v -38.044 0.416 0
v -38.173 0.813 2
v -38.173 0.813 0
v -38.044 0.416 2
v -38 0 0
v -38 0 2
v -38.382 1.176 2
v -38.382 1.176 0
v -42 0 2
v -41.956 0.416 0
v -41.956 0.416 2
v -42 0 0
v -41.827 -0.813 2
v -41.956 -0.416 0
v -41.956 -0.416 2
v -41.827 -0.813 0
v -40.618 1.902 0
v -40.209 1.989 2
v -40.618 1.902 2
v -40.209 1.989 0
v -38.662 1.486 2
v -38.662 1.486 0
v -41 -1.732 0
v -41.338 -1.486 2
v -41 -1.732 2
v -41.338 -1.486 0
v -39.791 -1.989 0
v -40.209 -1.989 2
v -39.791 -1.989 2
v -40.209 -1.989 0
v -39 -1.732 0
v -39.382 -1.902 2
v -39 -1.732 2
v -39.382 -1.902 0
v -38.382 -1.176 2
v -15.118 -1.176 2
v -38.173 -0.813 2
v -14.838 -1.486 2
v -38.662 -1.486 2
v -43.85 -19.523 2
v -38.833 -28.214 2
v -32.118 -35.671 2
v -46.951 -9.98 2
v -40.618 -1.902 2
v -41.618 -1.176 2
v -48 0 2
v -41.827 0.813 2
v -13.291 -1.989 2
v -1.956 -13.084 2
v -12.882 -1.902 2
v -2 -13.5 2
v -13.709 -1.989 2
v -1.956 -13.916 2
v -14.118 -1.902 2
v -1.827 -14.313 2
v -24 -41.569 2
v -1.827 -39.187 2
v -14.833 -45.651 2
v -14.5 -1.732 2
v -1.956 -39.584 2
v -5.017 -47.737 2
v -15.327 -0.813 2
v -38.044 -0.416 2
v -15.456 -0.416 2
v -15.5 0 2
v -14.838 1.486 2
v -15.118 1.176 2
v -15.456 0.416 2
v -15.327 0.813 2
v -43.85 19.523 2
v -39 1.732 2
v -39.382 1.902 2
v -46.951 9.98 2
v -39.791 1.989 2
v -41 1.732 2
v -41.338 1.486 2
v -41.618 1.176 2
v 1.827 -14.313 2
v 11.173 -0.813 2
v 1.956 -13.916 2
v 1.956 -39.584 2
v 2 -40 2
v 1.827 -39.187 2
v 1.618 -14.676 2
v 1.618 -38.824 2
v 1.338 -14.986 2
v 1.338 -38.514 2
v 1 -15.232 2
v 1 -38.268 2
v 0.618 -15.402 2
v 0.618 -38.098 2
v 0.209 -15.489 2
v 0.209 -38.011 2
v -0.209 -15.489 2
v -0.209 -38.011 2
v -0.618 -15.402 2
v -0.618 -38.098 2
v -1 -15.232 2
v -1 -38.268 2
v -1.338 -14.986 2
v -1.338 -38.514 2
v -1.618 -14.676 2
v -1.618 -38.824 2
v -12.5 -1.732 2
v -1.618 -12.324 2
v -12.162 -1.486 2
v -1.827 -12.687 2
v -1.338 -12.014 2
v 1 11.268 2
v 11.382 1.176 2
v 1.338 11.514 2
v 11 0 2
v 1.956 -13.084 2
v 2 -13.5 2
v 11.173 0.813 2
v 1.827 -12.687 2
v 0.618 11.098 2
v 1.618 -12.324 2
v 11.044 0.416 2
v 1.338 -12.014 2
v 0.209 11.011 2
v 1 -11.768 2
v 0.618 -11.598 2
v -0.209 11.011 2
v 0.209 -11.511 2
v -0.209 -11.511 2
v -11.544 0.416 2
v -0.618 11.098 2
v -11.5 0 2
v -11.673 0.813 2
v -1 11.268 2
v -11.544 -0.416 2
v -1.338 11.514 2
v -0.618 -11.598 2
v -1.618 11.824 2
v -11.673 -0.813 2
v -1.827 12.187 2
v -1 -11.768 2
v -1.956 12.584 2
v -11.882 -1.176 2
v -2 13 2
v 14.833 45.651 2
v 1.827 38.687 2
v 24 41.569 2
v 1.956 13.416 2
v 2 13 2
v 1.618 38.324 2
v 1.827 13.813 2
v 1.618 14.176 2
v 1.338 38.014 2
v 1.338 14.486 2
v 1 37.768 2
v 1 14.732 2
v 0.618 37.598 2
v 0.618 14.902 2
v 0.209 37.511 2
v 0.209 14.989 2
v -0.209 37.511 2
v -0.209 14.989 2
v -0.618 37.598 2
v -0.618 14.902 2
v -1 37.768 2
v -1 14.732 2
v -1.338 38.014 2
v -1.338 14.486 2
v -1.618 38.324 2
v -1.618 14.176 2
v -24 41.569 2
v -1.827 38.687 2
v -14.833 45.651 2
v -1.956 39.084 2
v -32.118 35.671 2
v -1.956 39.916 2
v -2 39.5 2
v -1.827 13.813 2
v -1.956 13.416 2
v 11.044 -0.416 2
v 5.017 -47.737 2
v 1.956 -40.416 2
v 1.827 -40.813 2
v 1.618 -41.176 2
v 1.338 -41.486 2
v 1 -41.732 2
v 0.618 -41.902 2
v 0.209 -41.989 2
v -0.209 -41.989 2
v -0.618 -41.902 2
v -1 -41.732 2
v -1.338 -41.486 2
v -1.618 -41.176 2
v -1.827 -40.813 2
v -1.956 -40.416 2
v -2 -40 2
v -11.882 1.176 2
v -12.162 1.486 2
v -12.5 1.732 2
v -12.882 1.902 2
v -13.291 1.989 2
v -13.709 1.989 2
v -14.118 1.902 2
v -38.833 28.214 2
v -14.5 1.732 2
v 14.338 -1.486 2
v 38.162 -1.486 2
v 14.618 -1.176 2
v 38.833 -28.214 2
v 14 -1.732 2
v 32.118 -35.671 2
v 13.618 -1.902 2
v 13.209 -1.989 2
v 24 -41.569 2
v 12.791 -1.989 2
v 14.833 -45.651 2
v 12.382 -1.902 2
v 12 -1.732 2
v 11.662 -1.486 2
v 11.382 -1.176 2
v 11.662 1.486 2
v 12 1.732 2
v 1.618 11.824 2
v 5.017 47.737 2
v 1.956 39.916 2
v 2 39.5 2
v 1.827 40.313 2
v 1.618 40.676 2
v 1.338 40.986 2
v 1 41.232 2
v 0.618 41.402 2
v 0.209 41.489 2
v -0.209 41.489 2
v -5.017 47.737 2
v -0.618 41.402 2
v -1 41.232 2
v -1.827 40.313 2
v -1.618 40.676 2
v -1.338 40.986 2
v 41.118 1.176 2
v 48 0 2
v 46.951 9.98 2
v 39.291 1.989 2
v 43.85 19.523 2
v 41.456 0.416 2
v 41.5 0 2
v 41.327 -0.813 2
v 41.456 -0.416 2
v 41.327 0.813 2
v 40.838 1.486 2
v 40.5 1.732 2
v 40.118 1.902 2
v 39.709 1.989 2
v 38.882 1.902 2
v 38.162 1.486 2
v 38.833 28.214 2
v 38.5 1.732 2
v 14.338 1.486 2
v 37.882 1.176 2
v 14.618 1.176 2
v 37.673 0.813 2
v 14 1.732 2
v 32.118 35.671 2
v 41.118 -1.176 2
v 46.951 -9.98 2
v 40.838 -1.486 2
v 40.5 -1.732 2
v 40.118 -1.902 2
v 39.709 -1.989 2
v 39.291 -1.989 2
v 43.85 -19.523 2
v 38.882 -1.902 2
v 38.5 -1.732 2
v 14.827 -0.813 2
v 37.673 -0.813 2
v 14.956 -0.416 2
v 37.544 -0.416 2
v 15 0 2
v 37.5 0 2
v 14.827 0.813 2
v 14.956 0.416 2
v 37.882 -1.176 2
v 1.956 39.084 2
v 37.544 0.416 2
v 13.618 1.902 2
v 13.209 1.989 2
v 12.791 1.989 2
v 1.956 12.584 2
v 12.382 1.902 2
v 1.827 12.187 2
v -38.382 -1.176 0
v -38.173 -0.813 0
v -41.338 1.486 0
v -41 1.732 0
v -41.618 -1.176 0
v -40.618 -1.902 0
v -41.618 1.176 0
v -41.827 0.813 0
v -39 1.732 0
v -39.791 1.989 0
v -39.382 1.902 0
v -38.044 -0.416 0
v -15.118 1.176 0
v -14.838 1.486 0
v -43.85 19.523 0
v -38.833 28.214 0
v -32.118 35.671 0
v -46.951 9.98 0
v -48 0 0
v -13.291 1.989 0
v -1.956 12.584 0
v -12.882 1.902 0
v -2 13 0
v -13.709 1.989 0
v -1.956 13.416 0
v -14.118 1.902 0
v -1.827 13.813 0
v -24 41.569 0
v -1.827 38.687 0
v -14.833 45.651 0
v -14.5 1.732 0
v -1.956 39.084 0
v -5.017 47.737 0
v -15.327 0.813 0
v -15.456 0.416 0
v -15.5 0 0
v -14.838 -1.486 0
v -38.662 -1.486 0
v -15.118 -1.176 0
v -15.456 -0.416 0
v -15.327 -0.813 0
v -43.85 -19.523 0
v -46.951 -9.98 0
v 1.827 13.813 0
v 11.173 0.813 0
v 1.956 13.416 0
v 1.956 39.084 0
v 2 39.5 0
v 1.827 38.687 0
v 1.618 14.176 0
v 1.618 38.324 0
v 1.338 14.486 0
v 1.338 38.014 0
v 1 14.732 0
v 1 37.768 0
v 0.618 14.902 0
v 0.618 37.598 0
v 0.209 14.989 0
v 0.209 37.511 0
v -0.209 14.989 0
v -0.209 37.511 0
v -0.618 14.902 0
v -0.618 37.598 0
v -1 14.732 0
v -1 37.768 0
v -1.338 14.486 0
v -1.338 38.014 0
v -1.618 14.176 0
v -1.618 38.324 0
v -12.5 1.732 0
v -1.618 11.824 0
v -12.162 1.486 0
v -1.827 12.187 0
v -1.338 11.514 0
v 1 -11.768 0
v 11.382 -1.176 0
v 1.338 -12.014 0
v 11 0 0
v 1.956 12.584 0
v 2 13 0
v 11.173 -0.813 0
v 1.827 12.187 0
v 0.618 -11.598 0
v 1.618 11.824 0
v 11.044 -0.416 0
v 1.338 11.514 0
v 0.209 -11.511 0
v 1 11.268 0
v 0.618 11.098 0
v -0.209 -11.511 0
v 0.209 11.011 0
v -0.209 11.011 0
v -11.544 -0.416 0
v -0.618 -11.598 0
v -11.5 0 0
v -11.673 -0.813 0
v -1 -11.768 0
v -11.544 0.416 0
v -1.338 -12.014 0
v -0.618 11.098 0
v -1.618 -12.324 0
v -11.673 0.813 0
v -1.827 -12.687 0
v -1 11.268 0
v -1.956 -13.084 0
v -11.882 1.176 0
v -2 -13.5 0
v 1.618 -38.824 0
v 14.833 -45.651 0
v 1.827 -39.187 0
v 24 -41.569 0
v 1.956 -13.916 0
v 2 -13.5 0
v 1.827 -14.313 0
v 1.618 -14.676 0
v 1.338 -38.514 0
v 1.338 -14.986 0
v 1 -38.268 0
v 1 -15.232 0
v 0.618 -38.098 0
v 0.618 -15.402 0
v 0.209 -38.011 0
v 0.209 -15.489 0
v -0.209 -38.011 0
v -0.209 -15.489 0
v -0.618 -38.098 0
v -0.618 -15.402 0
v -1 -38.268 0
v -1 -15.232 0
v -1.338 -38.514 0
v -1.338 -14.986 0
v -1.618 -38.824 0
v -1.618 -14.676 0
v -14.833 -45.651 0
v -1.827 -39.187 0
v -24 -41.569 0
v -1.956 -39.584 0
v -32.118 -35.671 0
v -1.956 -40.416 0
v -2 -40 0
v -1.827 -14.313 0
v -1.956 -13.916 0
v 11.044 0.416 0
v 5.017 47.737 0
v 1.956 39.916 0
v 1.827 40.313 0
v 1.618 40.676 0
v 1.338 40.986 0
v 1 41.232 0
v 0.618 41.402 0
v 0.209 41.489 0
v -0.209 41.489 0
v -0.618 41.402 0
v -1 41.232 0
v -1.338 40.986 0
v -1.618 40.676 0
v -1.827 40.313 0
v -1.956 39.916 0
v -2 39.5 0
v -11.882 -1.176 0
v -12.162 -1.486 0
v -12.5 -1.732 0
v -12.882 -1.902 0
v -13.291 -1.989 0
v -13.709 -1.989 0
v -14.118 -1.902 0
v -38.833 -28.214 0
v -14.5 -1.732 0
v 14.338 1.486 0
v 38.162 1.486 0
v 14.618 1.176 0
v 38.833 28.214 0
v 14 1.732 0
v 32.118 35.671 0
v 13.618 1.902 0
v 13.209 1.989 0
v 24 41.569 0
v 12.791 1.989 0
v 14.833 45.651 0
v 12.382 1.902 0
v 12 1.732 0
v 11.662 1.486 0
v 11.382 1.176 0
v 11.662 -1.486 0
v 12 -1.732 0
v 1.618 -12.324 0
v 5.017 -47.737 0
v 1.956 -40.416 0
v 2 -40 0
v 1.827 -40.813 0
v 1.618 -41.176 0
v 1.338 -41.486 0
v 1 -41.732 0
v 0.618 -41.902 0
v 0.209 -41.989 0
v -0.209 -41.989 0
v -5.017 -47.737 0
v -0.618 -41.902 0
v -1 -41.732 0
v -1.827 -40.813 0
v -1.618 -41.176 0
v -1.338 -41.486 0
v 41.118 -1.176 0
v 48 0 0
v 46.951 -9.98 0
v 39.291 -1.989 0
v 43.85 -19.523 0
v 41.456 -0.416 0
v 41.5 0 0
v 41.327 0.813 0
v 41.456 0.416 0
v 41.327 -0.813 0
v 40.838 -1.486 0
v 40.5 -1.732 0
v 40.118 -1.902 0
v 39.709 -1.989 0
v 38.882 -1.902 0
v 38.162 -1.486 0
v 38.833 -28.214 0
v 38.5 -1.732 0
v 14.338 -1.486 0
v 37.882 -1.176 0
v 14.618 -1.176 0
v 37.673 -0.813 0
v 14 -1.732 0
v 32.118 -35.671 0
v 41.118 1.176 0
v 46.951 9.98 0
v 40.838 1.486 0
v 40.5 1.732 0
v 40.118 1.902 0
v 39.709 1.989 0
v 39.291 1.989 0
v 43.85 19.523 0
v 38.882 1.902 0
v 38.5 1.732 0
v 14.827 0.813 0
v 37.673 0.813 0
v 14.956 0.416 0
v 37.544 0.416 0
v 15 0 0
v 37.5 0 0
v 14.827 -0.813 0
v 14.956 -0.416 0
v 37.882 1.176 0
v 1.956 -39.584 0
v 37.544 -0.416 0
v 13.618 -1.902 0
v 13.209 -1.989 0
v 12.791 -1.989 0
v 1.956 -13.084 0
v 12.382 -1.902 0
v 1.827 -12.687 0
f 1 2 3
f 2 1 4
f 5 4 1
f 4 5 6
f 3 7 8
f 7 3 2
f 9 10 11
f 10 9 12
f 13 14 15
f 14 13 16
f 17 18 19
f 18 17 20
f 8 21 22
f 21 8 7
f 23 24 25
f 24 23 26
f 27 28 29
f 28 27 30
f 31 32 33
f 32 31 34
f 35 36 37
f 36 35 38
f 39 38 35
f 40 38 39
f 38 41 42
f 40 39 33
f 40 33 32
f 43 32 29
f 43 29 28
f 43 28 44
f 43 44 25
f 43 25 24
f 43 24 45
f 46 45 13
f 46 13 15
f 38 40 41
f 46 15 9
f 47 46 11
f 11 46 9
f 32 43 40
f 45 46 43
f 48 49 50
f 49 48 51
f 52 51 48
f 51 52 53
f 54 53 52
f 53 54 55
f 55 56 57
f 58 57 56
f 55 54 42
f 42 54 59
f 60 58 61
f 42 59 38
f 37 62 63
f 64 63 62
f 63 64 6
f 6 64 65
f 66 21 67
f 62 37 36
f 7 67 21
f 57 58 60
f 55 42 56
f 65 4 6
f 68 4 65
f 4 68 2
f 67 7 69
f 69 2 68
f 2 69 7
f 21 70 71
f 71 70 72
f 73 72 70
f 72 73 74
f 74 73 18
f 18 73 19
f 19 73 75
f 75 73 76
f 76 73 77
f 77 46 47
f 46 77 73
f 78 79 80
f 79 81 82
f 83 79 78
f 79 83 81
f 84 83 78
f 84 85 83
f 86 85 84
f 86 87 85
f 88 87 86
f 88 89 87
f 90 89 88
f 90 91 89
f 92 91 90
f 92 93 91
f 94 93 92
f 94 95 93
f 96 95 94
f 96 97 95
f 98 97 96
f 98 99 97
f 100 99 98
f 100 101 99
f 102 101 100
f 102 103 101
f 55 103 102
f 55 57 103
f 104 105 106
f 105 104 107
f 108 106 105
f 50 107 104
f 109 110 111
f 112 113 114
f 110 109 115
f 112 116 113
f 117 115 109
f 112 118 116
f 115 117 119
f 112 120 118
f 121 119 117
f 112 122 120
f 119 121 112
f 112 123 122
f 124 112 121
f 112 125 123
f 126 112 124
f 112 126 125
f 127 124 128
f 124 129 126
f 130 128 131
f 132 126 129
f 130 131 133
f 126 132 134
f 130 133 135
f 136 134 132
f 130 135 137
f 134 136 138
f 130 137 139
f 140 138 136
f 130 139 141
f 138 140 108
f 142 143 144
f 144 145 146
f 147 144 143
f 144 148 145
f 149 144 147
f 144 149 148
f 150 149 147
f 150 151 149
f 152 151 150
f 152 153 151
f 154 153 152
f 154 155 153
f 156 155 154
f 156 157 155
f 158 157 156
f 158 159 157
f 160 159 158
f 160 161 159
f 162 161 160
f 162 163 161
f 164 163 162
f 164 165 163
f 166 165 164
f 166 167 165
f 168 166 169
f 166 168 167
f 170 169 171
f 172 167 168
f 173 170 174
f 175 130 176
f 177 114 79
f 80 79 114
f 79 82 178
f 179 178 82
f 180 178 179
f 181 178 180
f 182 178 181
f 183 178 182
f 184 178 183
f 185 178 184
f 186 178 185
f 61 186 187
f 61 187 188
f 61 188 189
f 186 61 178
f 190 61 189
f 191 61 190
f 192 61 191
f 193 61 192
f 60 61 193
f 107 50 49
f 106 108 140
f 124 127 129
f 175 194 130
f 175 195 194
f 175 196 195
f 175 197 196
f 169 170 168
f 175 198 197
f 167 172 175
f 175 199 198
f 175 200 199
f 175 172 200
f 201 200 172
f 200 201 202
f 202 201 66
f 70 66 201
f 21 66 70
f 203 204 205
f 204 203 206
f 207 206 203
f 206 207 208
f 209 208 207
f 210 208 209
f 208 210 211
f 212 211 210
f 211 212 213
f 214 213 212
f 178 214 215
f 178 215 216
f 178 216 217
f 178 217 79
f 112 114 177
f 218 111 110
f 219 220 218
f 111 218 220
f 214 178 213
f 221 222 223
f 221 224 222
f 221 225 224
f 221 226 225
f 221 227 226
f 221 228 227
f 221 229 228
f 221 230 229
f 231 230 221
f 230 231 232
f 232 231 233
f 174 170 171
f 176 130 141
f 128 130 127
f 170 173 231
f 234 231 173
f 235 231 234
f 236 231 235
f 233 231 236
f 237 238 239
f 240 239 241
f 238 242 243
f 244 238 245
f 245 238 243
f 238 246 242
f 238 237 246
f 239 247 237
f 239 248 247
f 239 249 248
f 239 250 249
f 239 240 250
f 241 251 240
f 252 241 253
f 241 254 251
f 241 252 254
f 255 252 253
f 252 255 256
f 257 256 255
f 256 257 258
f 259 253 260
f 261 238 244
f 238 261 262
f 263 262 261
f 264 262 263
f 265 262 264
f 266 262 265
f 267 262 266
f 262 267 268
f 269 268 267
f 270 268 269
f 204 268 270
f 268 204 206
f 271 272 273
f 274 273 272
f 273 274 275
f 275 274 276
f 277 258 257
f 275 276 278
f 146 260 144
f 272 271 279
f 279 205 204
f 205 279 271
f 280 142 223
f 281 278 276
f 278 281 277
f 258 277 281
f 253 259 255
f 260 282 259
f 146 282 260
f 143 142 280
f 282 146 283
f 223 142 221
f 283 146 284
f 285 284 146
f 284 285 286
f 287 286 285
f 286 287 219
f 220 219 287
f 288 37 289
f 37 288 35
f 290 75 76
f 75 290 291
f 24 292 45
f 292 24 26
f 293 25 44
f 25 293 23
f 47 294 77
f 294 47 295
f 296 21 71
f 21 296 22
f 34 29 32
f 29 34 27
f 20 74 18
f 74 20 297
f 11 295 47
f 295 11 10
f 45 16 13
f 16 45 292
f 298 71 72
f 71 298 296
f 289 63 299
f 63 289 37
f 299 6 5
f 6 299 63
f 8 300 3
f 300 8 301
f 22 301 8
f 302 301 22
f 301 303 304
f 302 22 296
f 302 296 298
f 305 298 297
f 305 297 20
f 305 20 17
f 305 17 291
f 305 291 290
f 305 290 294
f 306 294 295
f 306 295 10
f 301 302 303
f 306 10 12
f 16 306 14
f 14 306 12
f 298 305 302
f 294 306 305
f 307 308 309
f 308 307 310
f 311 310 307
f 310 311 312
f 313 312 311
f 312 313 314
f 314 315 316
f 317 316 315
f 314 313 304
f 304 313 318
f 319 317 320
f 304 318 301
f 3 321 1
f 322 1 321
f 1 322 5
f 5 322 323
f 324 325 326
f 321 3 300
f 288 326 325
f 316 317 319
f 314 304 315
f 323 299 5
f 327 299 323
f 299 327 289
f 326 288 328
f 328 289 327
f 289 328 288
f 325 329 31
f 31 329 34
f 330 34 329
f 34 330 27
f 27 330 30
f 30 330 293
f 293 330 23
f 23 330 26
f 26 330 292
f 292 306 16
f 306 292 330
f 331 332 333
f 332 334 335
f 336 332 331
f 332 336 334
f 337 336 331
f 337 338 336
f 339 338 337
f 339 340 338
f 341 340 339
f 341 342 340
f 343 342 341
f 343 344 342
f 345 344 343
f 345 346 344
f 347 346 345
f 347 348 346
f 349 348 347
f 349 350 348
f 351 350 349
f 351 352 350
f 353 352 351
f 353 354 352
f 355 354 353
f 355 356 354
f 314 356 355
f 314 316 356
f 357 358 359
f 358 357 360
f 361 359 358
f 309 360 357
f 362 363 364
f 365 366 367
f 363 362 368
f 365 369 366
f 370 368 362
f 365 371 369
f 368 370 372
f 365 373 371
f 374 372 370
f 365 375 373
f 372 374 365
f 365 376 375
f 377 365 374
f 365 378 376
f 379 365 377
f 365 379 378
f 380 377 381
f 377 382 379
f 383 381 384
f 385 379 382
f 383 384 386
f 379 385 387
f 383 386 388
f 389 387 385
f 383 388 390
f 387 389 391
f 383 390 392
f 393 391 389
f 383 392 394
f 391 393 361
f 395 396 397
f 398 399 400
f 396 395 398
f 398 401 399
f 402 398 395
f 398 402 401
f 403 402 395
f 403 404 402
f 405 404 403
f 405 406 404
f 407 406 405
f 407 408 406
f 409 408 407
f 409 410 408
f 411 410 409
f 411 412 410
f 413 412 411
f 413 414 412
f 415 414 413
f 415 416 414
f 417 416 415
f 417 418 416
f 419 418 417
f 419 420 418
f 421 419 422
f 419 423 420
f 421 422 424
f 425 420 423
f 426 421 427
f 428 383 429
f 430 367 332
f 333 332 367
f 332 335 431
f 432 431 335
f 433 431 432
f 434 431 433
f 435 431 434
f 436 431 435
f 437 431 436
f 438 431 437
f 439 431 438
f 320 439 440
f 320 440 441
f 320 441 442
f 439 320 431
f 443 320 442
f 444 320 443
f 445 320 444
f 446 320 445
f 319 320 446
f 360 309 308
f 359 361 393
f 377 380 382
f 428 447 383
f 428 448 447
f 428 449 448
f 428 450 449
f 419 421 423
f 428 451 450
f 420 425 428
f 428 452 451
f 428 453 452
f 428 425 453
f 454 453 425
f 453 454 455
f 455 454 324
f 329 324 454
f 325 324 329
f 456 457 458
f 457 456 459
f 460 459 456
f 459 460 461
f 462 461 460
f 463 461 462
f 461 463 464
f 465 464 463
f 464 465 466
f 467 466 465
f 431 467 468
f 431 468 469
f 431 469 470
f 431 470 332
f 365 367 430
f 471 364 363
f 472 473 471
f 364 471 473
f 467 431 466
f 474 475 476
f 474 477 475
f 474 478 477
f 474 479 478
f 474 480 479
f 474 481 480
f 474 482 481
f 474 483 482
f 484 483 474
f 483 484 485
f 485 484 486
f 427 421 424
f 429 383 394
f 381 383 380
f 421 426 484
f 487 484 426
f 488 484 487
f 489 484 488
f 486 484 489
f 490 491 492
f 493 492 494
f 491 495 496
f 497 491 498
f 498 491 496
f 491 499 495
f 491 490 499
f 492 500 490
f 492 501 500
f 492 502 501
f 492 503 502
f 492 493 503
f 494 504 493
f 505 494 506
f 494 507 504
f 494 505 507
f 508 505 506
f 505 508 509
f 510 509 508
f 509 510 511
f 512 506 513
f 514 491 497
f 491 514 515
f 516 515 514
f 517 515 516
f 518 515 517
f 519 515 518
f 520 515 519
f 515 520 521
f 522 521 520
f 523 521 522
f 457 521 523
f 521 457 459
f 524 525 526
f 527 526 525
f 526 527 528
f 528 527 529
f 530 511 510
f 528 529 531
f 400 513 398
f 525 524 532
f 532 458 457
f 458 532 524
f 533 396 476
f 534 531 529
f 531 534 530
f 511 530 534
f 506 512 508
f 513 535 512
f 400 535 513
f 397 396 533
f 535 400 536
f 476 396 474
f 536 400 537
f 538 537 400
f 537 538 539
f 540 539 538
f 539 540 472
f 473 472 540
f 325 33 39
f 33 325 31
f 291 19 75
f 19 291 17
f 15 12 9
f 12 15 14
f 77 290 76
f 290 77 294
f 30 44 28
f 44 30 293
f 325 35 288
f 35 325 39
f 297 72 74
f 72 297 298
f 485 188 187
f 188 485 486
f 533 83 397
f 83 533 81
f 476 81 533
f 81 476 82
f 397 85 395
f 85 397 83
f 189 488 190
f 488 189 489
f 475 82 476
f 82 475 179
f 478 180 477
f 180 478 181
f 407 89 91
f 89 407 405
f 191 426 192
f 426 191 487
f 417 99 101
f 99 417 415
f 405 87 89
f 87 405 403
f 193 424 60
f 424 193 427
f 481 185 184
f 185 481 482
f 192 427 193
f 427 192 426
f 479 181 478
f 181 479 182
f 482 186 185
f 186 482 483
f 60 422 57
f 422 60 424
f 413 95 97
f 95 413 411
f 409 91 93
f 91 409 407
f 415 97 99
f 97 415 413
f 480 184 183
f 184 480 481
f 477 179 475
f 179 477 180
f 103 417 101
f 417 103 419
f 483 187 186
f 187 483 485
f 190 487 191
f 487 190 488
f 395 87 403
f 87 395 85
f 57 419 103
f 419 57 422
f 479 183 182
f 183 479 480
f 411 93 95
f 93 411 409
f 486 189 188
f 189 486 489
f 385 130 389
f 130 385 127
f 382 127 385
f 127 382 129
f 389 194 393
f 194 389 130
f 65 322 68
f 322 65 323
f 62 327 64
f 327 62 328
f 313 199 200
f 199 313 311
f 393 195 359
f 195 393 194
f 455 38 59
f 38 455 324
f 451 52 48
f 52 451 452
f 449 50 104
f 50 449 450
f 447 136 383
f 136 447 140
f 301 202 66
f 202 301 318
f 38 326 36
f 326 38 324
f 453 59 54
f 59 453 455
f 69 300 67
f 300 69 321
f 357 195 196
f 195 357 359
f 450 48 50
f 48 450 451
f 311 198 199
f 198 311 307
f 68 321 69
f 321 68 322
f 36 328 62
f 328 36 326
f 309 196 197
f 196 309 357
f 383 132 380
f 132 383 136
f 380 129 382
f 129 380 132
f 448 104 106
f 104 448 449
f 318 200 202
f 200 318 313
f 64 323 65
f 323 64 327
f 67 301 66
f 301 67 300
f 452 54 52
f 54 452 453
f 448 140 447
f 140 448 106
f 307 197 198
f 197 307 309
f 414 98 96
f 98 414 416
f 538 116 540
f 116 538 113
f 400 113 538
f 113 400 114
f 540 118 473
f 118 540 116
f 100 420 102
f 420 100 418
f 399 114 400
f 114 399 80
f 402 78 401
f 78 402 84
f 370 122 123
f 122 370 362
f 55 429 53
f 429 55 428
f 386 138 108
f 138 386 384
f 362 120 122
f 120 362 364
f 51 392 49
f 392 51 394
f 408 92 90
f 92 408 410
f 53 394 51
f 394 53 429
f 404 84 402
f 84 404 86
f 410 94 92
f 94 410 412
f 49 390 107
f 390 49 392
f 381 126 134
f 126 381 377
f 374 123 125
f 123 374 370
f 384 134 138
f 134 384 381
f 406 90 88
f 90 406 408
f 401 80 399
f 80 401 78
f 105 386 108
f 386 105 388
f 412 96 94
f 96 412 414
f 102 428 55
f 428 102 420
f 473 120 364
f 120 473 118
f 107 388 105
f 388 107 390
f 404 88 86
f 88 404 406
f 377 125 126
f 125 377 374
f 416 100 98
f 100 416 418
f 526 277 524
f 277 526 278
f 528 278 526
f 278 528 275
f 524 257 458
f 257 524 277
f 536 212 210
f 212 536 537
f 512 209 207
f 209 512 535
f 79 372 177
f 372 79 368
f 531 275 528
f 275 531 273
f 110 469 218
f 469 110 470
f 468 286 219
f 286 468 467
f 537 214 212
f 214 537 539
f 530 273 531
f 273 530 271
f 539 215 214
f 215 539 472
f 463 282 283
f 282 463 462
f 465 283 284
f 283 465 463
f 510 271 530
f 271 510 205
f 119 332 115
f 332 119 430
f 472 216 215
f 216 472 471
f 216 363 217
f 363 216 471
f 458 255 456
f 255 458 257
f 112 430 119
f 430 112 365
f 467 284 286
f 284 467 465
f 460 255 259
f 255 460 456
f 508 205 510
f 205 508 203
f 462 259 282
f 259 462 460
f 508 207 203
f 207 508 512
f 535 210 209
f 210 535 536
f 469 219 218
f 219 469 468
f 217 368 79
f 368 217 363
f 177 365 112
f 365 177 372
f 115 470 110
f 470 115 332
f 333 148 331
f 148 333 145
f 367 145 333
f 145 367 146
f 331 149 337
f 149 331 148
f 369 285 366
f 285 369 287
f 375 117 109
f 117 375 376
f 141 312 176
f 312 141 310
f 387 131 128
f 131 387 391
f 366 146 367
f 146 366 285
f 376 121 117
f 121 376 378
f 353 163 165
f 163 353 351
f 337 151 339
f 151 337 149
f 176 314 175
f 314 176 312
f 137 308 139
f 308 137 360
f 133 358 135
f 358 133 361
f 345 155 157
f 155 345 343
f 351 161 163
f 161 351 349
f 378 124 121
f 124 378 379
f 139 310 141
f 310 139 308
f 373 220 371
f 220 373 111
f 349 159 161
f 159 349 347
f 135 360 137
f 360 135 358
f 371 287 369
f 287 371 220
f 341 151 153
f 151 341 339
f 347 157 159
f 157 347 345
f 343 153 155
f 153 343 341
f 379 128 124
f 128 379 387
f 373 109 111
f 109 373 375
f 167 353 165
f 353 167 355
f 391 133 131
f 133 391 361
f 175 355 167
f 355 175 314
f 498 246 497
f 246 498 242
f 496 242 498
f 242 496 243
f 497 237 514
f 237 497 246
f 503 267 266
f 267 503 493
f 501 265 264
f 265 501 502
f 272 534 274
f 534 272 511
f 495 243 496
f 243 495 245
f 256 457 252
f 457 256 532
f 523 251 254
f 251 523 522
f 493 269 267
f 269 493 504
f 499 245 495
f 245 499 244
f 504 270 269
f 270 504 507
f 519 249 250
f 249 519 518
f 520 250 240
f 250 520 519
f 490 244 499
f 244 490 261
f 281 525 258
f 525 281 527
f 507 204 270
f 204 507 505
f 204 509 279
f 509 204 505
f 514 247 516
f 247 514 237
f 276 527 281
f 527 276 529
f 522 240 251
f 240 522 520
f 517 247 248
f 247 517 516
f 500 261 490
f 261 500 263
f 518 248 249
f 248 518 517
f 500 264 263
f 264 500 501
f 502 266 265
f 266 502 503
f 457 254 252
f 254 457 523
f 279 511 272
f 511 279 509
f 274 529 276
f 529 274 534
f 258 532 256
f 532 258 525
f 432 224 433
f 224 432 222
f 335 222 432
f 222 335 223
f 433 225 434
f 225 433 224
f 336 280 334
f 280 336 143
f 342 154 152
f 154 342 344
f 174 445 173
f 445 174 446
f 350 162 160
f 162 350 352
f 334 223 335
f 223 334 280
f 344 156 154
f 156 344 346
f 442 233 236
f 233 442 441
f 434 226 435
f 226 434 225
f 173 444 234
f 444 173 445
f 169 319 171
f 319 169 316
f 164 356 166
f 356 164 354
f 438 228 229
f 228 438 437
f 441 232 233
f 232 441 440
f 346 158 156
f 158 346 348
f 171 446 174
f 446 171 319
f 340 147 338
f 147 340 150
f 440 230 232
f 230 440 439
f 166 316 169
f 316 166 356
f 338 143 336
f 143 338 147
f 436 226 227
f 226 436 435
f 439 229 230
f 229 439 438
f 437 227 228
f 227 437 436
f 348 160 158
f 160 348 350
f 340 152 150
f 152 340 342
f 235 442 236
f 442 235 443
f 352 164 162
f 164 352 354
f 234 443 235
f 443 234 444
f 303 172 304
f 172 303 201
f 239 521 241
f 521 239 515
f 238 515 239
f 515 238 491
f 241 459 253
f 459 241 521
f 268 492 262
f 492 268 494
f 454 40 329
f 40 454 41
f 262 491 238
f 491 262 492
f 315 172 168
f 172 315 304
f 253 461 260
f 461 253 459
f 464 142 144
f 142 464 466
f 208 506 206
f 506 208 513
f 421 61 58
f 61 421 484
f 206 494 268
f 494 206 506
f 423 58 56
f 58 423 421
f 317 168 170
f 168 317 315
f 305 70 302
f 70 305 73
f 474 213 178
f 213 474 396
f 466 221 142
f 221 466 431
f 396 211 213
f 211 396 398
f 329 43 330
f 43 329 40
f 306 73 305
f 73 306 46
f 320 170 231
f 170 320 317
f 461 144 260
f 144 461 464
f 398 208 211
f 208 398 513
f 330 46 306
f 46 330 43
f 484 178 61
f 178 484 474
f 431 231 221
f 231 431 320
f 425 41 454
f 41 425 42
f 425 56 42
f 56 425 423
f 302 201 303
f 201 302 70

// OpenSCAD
module cubierta(h, dg, dp, fn){
    difference(){
        cylinder (h = h, d=dg, $fn=fn);
        
        for (i =[-40: 26.5 :44 ]) {
            translate([i, 0, 0])
                cylinder (h = h, d=dp, $fn=fn);
            translate([0, i, 0])
                cylinder (h = h, d=dp, $fn=fn);
        }
    }
}

cubierta(2, 96, 4, 30);
